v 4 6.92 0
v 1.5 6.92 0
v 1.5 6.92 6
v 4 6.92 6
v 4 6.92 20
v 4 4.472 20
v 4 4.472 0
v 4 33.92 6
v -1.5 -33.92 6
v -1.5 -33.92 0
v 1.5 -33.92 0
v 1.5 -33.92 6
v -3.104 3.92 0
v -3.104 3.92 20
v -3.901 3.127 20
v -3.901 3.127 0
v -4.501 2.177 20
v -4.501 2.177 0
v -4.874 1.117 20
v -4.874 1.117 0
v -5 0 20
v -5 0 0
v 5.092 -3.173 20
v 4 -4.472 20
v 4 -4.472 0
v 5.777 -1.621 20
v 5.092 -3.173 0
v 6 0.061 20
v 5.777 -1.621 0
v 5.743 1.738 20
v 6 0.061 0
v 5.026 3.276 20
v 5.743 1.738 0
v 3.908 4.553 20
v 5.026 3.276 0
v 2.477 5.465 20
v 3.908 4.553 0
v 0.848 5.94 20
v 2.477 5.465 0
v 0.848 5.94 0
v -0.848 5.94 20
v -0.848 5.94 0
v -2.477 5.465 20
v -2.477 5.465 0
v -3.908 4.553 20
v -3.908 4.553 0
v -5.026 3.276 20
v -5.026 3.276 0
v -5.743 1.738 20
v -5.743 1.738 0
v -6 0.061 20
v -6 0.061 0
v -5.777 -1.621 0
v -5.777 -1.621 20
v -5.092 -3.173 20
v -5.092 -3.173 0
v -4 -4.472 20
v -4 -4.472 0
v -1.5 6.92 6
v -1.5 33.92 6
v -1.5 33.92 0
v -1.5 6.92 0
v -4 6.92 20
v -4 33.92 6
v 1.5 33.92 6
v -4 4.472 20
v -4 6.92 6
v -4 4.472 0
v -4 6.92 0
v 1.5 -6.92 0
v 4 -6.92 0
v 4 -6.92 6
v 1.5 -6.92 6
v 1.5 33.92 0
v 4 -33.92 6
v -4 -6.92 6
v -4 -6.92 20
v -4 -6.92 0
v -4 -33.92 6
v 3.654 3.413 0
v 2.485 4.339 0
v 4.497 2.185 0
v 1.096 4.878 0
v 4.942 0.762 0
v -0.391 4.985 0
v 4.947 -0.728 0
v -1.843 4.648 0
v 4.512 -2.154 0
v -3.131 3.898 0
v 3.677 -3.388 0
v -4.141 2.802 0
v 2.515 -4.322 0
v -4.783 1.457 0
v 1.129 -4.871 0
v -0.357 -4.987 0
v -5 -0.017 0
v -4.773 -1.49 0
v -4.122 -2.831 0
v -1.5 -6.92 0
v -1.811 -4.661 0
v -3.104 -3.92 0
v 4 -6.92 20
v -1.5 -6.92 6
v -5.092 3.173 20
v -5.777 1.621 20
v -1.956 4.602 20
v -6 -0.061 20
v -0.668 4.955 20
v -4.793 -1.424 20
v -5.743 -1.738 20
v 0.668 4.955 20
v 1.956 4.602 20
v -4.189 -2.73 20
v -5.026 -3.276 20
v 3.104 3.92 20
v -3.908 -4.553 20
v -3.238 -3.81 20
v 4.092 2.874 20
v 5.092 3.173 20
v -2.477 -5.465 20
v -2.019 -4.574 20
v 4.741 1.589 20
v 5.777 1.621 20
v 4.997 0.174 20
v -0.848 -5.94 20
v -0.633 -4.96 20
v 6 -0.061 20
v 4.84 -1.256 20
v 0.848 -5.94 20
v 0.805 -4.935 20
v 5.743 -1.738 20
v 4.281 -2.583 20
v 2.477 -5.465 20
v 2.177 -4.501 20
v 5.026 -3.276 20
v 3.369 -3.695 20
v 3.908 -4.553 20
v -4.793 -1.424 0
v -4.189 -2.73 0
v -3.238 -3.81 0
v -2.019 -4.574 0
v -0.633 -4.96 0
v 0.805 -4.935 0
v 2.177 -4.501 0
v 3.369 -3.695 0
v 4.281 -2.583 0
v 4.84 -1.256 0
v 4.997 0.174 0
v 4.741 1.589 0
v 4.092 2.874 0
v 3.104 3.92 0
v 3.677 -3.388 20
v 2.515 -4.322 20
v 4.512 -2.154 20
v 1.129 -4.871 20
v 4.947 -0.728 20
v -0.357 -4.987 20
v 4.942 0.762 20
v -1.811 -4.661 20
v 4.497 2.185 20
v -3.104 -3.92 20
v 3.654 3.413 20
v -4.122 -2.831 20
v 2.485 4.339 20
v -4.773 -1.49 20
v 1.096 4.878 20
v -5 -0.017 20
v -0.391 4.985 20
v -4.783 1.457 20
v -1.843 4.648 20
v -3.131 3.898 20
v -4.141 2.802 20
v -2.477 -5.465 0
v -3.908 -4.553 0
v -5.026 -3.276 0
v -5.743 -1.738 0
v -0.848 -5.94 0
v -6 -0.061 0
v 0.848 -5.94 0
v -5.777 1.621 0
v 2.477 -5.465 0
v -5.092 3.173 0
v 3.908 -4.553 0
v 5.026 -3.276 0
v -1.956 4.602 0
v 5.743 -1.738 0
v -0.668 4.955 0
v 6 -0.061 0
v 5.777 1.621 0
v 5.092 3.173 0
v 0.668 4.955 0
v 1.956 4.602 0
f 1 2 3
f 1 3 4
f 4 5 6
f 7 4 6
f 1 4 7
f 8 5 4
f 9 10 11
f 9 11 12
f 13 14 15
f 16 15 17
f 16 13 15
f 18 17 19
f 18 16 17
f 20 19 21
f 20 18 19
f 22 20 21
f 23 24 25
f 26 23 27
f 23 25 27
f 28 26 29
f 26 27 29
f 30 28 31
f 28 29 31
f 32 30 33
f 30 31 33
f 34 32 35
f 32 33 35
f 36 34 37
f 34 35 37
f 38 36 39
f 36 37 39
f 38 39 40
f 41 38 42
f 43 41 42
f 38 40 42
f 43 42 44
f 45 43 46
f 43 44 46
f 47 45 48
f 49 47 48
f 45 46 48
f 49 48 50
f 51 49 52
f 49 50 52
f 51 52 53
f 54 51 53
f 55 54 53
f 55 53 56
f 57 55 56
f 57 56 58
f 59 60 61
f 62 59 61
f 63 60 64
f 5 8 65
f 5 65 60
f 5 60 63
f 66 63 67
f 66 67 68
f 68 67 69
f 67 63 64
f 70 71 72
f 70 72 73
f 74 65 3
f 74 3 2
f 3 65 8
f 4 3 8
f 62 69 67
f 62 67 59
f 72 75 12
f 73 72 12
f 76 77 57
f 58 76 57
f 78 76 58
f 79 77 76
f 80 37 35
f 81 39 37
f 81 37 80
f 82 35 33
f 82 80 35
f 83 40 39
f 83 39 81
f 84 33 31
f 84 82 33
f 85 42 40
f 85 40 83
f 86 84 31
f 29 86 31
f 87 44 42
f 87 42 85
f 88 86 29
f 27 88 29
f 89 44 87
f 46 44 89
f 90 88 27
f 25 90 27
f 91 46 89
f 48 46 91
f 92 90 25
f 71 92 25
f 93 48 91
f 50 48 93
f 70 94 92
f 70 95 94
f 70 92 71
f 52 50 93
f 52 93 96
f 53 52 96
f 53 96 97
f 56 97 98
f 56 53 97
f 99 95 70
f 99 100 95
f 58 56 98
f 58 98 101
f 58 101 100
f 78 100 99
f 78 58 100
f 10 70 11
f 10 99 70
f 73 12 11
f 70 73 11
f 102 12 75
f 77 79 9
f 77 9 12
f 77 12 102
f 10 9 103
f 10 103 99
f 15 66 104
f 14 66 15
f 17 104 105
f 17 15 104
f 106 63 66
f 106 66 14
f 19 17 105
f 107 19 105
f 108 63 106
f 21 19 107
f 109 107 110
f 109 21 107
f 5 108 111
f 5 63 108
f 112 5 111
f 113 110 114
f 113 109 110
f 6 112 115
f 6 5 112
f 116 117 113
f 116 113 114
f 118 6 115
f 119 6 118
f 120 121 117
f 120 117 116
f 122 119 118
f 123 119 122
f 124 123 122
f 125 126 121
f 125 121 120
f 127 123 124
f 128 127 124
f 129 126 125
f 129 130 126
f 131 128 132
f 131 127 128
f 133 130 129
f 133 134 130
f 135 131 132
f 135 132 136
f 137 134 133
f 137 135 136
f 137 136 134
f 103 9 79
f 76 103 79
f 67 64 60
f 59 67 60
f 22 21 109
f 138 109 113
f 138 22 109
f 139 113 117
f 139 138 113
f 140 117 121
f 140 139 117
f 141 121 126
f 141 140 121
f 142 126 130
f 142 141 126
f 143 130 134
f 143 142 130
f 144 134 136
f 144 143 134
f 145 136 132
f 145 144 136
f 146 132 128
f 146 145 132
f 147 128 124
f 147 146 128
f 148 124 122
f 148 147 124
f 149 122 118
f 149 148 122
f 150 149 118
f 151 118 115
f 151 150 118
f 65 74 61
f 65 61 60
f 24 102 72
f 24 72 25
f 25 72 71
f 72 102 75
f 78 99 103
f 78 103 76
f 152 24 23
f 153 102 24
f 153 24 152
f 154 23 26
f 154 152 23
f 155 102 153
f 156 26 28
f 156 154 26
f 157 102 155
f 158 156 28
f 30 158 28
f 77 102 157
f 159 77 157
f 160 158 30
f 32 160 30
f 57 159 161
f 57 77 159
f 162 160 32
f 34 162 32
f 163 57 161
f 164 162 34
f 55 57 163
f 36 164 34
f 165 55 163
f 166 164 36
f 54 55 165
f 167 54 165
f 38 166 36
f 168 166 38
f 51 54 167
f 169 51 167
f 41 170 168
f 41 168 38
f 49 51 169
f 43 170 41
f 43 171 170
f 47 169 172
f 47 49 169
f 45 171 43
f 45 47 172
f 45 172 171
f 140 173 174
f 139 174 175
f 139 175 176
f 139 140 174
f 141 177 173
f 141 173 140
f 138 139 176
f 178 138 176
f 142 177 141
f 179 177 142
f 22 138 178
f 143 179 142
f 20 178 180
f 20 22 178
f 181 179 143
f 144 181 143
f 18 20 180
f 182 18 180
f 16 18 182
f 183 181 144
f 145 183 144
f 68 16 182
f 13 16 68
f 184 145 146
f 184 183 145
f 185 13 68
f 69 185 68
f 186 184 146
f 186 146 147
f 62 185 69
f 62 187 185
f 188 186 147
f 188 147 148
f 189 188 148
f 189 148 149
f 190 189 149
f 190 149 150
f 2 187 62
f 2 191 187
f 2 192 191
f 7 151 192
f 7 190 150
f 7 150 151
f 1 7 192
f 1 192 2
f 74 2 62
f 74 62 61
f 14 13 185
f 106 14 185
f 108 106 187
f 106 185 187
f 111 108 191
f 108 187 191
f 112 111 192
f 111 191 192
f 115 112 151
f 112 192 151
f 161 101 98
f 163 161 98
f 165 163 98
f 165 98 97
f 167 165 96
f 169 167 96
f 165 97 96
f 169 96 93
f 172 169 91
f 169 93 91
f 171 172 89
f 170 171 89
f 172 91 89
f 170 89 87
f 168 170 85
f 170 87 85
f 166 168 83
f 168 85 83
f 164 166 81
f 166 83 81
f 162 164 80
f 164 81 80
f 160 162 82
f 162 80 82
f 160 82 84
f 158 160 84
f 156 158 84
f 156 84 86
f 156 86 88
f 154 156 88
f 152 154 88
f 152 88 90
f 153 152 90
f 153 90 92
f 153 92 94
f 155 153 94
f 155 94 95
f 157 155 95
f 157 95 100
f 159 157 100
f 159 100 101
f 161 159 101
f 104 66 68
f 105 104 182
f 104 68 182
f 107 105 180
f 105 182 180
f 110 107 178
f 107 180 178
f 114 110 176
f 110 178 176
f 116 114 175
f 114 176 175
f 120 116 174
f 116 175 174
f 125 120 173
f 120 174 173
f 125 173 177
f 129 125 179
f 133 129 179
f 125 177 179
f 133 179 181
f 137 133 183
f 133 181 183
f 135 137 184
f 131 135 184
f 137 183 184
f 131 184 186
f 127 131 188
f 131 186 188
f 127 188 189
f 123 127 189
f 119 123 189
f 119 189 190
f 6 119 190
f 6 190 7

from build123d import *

# Parameters (mm, degrees)
SKETCH1_R             = 6
SKETCH1_R_2           = 5
BOSS_EXTRUDE1_DEPTH   = 20
BOSS_EXTRUDE2_DEPTH   = 4
SKETCH3_W             = 2.5
SKETCH3_H             = 6
CUT_EXTRUDE1_DEPTH    = 27.000002
BODY_MOVE_COPY1_ANGLE = 180
SKETCH4_R             = 5
CUT_EXTRUDE2_DEPTH    = 40.831531803


with BuildPart() as part:
    # Sketch1 → Boss-Extrude1 (new body)
    with BuildSketch(Plane.XY):
        Circle(SKETCH1_R)
        Circle(SKETCH1_R_2, mode=Mode.SUBTRACT)
    extrude(amount=BOSS_EXTRUDE1_DEPTH)

    # Sketch2 → Boss-Extrude2 (add, symmetric)
    with BuildSketch(Plane(origin=(0, 0, 0), x_dir=(0, 0, -1), z_dir=(1, 0, 0))):
        Polygon((-20, 6.9197719), (-20, 3.9197719), (0, 3.9197719), (0, 33.9197719), (-6, 33.9197719), align=None)
    extrude(amount=BOSS_EXTRUDE2_DEPTH, both=True)

    # Sketch3 → Cut-Extrude1 (cut)
    with BuildSketch(Plane(origin=(0, 33.9197719, 0), x_dir=(1, 0, 0), z_dir=(0, 1, 0))):
        with Locations((-2.75, -3)):
            Rectangle(SKETCH3_W, SKETCH3_H)
        with Locations((2.75, -3)):
            Rectangle(SKETCH3_W, SKETCH3_H)
    extrude(amount=-CUT_EXTRUDE1_DEPTH, mode=Mode.SUBTRACT)


with BuildPart() as body_2:
    # Body-Move/Copy1: copy of part
    add(part.part.rotate(Axis((0, 0, 0), (0, 0, 1)), BODY_MOVE_COPY1_ANGLE))


with BuildPart() as cut_extrude2_tool:
    # Sketch4 → Cut-Extrude2 (new, through all)
    with BuildSketch(Plane(origin=(0, 0, 0), x_dir=(-1, 0, 0), z_dir=(0, 0, -1))):
        Circle(SKETCH4_R)
    extrude(amount=-CUT_EXTRUDE2_DEPTH)


with BuildPart() as part_1:
    add(part.part)

    # Cut-Extrude2: cut by cut_extrude2_tool
    add(cut_extrude2_tool.part, mode=Mode.SUBTRACT)


with BuildPart() as body_2_1:
    add(body_2.part)

    # Cut-Extrude2: cut by cut_extrude2_tool
    add(cut_extrude2_tool.part, mode=Mode.SUBTRACT)


solid = Compound([part_1.part, body_2_1.part])
